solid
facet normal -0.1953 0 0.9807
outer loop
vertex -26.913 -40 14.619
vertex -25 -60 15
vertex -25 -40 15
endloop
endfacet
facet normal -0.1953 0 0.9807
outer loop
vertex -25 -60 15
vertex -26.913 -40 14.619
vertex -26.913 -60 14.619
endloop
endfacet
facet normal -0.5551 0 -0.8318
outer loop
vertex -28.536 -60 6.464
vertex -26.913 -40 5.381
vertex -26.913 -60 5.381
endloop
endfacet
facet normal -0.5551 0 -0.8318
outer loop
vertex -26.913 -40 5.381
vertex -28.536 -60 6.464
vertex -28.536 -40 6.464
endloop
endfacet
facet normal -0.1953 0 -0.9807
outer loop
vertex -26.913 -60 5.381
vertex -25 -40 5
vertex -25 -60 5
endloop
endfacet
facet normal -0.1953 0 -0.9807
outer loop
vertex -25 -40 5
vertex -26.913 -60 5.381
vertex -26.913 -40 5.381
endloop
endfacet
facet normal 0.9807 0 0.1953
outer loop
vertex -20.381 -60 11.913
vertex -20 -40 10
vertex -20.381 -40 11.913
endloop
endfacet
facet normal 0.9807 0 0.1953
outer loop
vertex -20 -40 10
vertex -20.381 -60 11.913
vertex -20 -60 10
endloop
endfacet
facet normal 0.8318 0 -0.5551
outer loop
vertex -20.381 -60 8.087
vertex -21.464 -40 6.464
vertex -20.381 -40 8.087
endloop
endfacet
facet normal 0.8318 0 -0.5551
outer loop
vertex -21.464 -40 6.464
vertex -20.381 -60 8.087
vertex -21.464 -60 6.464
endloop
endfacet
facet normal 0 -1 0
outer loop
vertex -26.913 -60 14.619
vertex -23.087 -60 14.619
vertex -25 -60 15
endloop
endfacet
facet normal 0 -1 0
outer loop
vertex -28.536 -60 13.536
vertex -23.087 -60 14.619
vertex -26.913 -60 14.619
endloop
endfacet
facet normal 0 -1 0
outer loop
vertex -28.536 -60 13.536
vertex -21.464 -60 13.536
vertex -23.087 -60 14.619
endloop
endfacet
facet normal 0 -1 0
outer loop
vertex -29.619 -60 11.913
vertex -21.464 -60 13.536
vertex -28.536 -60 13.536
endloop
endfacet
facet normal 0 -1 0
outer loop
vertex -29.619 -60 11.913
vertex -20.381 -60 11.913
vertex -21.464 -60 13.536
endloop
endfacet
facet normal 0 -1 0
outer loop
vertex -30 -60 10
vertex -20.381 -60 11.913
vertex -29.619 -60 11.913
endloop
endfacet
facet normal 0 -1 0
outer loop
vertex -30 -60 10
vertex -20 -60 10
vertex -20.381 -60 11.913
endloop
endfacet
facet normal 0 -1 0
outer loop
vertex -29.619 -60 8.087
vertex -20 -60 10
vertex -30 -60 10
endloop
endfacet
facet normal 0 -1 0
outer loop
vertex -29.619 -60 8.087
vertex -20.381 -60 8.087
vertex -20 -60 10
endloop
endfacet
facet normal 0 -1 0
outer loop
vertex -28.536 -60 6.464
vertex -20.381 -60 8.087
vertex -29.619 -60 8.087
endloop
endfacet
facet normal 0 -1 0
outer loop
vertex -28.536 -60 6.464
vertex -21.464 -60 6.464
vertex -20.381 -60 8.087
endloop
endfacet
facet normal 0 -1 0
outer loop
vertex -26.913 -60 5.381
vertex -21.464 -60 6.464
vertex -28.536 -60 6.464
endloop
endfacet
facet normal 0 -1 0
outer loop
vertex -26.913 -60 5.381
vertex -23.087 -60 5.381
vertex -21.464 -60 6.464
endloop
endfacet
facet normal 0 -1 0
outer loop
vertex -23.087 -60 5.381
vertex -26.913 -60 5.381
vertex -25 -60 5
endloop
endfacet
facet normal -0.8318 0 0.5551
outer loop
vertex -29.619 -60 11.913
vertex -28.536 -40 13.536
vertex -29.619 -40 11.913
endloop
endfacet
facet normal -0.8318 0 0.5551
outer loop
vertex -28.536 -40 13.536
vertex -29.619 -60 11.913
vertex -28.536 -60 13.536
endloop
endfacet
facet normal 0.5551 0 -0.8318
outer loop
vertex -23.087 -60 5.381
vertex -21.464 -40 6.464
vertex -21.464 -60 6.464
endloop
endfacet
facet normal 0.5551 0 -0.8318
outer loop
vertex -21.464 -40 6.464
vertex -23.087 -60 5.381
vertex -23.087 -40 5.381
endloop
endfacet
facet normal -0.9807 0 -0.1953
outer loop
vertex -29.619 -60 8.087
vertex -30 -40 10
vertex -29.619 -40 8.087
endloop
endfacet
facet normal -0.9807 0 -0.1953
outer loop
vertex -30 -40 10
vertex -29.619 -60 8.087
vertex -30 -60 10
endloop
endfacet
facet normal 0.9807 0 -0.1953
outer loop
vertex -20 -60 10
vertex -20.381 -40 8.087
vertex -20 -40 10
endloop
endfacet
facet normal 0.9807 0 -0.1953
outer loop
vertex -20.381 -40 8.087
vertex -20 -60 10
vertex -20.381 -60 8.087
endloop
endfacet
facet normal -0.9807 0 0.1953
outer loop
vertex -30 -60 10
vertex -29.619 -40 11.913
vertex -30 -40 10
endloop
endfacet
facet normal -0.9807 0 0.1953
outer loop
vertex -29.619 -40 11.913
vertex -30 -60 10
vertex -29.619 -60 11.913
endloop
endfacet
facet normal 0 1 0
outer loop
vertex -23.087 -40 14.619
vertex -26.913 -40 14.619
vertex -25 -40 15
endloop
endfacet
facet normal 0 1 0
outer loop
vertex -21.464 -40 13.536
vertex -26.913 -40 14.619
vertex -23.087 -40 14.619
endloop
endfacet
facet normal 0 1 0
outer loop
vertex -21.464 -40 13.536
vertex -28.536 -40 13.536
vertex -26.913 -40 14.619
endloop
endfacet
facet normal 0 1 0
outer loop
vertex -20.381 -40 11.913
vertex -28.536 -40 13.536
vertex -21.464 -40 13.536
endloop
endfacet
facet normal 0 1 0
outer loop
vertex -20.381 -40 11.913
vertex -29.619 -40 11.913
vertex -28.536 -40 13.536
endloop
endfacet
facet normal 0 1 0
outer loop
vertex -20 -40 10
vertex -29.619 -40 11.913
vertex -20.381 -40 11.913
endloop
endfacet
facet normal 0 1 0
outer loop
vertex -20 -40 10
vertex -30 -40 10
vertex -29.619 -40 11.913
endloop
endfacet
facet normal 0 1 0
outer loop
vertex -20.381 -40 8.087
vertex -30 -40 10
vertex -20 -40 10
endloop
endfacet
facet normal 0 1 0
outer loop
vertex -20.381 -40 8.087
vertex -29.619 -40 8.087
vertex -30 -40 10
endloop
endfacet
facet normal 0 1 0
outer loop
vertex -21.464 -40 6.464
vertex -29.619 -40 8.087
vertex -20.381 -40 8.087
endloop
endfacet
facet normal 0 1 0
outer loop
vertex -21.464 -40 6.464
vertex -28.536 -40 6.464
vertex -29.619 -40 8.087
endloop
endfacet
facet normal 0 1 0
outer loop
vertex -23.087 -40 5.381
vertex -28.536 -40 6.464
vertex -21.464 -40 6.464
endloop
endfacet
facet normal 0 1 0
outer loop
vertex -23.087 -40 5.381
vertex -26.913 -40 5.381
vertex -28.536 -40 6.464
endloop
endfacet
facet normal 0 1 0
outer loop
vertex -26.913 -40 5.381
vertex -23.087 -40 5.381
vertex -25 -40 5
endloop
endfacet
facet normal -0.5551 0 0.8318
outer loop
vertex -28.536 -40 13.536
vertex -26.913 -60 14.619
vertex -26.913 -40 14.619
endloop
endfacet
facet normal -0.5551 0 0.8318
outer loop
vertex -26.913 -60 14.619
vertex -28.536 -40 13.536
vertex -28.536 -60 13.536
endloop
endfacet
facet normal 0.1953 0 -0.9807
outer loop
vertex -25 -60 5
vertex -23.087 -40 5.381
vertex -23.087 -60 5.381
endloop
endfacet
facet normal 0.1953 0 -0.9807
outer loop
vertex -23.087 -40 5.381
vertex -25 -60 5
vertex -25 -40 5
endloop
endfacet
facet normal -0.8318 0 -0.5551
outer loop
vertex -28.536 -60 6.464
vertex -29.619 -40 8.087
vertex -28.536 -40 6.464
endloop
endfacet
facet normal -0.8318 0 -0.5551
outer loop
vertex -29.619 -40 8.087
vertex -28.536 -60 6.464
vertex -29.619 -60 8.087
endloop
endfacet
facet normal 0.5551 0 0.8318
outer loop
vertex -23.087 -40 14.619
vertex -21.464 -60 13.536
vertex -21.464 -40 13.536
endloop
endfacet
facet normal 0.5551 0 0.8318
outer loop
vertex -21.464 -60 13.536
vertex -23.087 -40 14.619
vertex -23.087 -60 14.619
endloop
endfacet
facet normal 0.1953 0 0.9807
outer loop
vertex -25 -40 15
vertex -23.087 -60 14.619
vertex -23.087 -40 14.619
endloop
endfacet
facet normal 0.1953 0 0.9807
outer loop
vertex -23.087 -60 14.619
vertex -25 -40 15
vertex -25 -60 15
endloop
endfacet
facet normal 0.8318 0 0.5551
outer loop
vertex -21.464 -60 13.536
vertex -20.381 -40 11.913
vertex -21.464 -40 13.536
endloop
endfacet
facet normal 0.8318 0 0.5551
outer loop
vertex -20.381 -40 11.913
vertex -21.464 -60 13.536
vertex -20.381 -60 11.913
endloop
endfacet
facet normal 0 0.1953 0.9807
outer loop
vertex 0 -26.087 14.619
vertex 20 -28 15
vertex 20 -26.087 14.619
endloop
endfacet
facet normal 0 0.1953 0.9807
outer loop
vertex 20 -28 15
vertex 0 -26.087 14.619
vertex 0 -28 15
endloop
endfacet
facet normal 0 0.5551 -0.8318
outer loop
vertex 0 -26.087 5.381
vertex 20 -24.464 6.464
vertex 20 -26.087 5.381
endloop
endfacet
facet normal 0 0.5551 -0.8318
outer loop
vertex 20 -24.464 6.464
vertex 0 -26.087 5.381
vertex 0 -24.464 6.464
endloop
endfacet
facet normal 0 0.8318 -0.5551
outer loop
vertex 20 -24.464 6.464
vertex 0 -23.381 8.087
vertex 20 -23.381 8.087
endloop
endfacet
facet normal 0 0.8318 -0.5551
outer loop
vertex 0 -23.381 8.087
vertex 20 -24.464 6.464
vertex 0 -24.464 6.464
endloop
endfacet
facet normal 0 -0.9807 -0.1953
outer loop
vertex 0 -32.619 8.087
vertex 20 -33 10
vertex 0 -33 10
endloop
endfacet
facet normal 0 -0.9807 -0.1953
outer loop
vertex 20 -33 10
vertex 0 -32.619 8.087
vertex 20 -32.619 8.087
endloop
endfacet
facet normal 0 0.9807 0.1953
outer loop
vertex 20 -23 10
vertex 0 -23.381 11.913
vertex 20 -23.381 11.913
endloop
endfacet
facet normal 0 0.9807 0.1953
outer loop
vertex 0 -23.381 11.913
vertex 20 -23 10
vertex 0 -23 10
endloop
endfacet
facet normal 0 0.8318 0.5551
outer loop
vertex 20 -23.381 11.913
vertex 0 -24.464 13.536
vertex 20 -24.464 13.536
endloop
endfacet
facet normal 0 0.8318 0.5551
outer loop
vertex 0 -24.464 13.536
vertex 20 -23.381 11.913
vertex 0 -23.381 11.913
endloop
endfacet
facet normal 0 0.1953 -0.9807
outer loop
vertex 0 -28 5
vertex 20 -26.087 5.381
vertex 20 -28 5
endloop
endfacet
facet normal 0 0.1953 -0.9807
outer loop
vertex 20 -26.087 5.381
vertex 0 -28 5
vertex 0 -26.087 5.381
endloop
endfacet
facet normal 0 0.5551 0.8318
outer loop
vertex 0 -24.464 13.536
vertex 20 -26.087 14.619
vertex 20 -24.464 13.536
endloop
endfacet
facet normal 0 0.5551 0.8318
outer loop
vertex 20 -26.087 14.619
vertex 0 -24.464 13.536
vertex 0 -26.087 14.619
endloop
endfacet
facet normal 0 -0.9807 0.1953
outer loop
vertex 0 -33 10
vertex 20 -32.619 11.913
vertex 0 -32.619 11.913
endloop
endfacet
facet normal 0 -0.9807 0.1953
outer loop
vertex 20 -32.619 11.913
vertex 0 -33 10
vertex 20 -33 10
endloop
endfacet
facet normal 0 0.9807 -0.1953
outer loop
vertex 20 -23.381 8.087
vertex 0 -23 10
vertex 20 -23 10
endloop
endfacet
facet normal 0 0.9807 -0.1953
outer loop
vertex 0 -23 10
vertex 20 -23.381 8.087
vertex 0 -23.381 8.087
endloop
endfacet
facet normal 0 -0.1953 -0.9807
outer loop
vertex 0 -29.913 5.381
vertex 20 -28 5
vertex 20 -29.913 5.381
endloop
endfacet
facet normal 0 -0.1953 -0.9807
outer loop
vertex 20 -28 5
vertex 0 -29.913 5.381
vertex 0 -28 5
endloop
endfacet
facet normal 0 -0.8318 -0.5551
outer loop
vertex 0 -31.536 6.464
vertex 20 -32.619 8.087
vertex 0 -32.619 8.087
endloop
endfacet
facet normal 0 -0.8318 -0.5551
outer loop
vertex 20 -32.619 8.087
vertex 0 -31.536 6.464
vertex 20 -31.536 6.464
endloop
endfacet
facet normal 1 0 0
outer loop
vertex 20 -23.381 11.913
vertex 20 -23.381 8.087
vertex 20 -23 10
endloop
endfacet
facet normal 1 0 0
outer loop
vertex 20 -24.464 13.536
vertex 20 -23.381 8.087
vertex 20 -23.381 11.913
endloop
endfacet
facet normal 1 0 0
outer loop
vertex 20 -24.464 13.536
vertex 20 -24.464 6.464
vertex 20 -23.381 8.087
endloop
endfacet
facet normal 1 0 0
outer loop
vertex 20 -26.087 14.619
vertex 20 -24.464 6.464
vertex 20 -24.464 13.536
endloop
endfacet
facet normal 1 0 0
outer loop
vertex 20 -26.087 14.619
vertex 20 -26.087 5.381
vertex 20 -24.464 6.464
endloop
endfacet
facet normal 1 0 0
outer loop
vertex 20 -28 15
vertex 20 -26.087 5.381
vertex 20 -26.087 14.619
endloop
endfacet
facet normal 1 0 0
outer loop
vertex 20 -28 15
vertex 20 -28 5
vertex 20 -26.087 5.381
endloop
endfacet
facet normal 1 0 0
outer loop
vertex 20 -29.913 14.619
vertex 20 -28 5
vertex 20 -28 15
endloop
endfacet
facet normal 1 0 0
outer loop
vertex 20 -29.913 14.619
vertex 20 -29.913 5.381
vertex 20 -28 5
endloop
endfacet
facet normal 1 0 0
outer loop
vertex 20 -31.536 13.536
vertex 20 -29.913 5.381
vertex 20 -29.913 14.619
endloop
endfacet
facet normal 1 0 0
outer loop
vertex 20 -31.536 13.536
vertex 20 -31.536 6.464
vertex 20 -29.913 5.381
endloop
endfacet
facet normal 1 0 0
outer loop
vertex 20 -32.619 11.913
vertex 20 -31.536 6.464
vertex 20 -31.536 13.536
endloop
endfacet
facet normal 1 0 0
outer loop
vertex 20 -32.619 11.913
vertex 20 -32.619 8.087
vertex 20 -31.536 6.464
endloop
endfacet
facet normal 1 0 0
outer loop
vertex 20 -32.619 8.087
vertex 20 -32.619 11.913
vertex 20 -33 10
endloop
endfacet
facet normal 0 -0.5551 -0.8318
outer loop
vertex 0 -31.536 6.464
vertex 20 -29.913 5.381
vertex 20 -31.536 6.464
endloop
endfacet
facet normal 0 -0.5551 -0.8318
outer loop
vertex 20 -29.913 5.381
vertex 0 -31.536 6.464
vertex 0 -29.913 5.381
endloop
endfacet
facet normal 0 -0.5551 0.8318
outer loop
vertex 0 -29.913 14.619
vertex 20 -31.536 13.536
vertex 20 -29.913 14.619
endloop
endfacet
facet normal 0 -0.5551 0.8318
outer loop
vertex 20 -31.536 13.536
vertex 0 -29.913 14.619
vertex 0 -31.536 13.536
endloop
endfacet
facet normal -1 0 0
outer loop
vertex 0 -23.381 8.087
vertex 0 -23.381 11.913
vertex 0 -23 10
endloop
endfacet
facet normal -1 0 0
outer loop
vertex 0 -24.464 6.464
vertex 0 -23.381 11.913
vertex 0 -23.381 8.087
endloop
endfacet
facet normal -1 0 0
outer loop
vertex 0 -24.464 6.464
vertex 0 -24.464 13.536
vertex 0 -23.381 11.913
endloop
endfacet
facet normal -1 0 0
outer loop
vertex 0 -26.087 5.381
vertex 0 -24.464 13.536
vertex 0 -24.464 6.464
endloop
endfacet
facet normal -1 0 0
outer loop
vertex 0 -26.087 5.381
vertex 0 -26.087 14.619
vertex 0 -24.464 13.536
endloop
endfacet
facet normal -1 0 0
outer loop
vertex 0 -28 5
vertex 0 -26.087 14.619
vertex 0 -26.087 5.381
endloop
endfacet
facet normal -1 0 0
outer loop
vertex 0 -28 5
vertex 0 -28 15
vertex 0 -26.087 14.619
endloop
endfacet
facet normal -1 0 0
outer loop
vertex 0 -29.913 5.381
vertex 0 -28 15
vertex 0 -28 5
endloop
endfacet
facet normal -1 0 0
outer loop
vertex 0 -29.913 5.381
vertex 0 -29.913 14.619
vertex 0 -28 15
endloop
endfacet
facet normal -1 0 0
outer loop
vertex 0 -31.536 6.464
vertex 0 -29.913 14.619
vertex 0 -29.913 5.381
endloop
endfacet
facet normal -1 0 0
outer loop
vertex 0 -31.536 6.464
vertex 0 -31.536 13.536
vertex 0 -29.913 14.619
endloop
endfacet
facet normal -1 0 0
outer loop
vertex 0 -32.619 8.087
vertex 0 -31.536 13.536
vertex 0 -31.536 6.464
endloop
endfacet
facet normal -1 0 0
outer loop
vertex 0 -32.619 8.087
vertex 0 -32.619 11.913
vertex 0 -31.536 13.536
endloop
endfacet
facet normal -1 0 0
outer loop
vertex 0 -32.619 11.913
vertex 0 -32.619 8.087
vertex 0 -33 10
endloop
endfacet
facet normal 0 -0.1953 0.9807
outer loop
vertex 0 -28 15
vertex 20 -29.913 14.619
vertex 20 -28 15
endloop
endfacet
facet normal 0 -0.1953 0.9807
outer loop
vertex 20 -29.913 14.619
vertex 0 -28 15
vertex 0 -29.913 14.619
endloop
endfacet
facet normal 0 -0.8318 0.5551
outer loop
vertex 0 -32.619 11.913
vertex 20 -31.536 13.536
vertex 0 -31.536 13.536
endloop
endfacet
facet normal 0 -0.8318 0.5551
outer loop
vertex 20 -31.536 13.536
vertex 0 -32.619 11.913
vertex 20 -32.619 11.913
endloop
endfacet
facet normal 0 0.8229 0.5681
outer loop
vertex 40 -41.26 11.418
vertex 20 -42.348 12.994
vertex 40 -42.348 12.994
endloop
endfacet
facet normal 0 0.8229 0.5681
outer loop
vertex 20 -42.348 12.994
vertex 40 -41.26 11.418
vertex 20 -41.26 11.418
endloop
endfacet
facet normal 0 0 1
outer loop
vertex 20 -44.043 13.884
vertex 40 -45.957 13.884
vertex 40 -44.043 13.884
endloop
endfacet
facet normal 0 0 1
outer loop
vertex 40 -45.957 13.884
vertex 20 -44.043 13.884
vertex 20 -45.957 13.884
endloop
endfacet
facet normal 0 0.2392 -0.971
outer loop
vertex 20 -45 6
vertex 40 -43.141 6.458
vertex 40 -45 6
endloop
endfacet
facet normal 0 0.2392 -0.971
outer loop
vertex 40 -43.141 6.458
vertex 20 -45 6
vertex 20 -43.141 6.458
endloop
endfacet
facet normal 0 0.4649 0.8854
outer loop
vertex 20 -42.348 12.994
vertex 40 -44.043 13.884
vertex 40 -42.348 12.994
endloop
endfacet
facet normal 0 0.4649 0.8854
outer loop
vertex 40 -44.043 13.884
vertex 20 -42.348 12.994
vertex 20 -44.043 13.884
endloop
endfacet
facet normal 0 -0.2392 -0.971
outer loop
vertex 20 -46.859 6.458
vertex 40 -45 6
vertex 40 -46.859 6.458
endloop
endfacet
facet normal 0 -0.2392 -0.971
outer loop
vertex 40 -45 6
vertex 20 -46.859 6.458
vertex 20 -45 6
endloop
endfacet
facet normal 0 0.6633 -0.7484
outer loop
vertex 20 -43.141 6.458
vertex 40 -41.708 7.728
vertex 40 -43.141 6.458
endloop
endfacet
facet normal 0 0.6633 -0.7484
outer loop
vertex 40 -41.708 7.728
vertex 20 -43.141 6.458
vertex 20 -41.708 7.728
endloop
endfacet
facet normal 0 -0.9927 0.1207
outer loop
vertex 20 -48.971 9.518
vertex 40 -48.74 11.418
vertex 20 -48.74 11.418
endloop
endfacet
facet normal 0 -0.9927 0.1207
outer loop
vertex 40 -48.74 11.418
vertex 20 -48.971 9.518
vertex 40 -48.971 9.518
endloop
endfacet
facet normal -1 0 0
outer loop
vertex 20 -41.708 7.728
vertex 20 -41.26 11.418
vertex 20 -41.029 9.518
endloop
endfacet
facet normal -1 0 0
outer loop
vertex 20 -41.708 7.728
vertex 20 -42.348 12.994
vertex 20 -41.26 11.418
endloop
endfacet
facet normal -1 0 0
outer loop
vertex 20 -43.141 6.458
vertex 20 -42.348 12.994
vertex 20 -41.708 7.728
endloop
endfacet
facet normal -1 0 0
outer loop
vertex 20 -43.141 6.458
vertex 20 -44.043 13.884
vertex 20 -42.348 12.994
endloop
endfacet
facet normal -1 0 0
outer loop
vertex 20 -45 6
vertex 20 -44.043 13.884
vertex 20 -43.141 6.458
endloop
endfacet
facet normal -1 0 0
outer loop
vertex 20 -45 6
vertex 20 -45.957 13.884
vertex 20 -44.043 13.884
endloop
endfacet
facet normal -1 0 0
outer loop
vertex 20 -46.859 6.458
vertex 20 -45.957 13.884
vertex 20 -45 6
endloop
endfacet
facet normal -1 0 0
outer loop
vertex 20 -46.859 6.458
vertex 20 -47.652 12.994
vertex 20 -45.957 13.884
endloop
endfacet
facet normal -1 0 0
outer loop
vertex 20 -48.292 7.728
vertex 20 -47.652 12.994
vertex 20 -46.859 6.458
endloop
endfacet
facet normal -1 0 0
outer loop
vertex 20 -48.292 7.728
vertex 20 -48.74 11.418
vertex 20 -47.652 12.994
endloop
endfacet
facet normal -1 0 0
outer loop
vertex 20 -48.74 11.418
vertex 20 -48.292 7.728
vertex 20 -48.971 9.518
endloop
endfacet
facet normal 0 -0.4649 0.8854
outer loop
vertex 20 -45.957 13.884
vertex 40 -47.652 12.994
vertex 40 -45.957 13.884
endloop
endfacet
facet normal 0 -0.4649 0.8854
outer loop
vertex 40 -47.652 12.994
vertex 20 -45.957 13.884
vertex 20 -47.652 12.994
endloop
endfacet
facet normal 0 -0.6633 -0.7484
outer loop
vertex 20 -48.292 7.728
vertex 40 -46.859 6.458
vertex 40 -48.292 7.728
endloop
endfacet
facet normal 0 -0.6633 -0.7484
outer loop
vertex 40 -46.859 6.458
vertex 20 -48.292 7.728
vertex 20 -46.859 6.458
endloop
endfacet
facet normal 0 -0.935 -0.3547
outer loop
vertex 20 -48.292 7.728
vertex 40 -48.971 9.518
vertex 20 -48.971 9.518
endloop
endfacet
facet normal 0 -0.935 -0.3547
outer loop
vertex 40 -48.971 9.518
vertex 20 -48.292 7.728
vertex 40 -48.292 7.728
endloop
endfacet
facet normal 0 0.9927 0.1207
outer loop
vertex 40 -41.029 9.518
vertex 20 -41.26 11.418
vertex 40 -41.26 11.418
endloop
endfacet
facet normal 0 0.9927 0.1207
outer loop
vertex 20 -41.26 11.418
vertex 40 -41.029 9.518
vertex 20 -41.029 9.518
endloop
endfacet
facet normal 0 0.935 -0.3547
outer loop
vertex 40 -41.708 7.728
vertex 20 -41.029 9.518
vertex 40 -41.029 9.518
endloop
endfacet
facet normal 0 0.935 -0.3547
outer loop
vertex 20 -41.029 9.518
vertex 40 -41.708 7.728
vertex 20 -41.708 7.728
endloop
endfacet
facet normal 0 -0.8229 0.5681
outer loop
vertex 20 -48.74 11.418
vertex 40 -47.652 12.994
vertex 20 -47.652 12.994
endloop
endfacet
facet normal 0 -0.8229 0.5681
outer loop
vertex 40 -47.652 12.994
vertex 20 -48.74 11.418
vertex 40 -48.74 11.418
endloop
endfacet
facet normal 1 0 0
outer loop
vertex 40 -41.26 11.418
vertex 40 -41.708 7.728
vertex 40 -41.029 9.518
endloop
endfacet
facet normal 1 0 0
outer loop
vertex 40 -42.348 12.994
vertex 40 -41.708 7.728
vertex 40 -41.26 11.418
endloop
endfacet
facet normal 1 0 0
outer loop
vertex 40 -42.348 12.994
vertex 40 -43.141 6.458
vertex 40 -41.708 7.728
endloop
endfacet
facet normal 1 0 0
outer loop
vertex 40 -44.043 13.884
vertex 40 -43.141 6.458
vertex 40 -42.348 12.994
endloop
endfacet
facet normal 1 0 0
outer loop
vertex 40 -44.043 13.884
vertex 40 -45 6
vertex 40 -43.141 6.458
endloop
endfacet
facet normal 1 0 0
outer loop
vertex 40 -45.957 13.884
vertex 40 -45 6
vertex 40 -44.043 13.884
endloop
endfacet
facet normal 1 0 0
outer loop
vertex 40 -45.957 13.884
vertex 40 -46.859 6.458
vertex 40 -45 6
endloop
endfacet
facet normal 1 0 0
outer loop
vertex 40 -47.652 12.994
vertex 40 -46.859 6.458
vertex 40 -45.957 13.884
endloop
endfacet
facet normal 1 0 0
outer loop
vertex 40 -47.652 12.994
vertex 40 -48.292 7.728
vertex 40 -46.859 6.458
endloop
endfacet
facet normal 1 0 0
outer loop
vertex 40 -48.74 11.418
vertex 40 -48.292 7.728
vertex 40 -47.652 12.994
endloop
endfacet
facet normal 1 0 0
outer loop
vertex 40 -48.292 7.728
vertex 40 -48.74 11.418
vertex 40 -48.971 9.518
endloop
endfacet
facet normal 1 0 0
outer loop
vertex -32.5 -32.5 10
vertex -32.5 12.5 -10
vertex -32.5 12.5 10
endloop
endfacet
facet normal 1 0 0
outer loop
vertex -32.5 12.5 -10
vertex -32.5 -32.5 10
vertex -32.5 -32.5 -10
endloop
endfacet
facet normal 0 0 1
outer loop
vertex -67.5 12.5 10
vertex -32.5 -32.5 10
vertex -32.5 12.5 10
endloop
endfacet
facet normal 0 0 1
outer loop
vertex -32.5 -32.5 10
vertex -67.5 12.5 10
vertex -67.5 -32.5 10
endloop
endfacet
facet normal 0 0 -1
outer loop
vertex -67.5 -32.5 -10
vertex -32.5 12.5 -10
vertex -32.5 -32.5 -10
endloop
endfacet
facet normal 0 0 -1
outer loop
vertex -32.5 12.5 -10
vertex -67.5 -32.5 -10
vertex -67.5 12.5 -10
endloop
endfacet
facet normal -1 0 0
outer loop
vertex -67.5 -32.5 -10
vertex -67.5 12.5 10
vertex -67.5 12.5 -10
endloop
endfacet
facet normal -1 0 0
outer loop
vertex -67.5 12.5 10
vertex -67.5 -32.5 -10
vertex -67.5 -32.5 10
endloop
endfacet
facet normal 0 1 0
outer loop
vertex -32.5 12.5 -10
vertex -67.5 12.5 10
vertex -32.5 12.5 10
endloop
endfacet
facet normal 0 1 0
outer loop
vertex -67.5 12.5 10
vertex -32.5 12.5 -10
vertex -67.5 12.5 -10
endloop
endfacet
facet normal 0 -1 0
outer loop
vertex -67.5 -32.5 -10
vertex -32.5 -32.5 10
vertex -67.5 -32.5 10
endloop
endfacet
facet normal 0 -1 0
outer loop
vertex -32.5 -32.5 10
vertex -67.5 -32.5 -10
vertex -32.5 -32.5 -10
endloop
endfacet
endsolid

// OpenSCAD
module wiring_passthrough() {

    translate([-25,-50,10])
        rotate([0,90,90])
        cylinder(20,5,5,true);
    translate([10,-28,10])
        rotate([0,90,0])
        cylinder(20,5,5,true);
    translate([30,-45,10])
        rotate([0,90,0])
        cylinder(20,4,4,true);
    translate([-50,-10,0])
        cube([35,45,20], center = true);
}

wiring_passthrough();
